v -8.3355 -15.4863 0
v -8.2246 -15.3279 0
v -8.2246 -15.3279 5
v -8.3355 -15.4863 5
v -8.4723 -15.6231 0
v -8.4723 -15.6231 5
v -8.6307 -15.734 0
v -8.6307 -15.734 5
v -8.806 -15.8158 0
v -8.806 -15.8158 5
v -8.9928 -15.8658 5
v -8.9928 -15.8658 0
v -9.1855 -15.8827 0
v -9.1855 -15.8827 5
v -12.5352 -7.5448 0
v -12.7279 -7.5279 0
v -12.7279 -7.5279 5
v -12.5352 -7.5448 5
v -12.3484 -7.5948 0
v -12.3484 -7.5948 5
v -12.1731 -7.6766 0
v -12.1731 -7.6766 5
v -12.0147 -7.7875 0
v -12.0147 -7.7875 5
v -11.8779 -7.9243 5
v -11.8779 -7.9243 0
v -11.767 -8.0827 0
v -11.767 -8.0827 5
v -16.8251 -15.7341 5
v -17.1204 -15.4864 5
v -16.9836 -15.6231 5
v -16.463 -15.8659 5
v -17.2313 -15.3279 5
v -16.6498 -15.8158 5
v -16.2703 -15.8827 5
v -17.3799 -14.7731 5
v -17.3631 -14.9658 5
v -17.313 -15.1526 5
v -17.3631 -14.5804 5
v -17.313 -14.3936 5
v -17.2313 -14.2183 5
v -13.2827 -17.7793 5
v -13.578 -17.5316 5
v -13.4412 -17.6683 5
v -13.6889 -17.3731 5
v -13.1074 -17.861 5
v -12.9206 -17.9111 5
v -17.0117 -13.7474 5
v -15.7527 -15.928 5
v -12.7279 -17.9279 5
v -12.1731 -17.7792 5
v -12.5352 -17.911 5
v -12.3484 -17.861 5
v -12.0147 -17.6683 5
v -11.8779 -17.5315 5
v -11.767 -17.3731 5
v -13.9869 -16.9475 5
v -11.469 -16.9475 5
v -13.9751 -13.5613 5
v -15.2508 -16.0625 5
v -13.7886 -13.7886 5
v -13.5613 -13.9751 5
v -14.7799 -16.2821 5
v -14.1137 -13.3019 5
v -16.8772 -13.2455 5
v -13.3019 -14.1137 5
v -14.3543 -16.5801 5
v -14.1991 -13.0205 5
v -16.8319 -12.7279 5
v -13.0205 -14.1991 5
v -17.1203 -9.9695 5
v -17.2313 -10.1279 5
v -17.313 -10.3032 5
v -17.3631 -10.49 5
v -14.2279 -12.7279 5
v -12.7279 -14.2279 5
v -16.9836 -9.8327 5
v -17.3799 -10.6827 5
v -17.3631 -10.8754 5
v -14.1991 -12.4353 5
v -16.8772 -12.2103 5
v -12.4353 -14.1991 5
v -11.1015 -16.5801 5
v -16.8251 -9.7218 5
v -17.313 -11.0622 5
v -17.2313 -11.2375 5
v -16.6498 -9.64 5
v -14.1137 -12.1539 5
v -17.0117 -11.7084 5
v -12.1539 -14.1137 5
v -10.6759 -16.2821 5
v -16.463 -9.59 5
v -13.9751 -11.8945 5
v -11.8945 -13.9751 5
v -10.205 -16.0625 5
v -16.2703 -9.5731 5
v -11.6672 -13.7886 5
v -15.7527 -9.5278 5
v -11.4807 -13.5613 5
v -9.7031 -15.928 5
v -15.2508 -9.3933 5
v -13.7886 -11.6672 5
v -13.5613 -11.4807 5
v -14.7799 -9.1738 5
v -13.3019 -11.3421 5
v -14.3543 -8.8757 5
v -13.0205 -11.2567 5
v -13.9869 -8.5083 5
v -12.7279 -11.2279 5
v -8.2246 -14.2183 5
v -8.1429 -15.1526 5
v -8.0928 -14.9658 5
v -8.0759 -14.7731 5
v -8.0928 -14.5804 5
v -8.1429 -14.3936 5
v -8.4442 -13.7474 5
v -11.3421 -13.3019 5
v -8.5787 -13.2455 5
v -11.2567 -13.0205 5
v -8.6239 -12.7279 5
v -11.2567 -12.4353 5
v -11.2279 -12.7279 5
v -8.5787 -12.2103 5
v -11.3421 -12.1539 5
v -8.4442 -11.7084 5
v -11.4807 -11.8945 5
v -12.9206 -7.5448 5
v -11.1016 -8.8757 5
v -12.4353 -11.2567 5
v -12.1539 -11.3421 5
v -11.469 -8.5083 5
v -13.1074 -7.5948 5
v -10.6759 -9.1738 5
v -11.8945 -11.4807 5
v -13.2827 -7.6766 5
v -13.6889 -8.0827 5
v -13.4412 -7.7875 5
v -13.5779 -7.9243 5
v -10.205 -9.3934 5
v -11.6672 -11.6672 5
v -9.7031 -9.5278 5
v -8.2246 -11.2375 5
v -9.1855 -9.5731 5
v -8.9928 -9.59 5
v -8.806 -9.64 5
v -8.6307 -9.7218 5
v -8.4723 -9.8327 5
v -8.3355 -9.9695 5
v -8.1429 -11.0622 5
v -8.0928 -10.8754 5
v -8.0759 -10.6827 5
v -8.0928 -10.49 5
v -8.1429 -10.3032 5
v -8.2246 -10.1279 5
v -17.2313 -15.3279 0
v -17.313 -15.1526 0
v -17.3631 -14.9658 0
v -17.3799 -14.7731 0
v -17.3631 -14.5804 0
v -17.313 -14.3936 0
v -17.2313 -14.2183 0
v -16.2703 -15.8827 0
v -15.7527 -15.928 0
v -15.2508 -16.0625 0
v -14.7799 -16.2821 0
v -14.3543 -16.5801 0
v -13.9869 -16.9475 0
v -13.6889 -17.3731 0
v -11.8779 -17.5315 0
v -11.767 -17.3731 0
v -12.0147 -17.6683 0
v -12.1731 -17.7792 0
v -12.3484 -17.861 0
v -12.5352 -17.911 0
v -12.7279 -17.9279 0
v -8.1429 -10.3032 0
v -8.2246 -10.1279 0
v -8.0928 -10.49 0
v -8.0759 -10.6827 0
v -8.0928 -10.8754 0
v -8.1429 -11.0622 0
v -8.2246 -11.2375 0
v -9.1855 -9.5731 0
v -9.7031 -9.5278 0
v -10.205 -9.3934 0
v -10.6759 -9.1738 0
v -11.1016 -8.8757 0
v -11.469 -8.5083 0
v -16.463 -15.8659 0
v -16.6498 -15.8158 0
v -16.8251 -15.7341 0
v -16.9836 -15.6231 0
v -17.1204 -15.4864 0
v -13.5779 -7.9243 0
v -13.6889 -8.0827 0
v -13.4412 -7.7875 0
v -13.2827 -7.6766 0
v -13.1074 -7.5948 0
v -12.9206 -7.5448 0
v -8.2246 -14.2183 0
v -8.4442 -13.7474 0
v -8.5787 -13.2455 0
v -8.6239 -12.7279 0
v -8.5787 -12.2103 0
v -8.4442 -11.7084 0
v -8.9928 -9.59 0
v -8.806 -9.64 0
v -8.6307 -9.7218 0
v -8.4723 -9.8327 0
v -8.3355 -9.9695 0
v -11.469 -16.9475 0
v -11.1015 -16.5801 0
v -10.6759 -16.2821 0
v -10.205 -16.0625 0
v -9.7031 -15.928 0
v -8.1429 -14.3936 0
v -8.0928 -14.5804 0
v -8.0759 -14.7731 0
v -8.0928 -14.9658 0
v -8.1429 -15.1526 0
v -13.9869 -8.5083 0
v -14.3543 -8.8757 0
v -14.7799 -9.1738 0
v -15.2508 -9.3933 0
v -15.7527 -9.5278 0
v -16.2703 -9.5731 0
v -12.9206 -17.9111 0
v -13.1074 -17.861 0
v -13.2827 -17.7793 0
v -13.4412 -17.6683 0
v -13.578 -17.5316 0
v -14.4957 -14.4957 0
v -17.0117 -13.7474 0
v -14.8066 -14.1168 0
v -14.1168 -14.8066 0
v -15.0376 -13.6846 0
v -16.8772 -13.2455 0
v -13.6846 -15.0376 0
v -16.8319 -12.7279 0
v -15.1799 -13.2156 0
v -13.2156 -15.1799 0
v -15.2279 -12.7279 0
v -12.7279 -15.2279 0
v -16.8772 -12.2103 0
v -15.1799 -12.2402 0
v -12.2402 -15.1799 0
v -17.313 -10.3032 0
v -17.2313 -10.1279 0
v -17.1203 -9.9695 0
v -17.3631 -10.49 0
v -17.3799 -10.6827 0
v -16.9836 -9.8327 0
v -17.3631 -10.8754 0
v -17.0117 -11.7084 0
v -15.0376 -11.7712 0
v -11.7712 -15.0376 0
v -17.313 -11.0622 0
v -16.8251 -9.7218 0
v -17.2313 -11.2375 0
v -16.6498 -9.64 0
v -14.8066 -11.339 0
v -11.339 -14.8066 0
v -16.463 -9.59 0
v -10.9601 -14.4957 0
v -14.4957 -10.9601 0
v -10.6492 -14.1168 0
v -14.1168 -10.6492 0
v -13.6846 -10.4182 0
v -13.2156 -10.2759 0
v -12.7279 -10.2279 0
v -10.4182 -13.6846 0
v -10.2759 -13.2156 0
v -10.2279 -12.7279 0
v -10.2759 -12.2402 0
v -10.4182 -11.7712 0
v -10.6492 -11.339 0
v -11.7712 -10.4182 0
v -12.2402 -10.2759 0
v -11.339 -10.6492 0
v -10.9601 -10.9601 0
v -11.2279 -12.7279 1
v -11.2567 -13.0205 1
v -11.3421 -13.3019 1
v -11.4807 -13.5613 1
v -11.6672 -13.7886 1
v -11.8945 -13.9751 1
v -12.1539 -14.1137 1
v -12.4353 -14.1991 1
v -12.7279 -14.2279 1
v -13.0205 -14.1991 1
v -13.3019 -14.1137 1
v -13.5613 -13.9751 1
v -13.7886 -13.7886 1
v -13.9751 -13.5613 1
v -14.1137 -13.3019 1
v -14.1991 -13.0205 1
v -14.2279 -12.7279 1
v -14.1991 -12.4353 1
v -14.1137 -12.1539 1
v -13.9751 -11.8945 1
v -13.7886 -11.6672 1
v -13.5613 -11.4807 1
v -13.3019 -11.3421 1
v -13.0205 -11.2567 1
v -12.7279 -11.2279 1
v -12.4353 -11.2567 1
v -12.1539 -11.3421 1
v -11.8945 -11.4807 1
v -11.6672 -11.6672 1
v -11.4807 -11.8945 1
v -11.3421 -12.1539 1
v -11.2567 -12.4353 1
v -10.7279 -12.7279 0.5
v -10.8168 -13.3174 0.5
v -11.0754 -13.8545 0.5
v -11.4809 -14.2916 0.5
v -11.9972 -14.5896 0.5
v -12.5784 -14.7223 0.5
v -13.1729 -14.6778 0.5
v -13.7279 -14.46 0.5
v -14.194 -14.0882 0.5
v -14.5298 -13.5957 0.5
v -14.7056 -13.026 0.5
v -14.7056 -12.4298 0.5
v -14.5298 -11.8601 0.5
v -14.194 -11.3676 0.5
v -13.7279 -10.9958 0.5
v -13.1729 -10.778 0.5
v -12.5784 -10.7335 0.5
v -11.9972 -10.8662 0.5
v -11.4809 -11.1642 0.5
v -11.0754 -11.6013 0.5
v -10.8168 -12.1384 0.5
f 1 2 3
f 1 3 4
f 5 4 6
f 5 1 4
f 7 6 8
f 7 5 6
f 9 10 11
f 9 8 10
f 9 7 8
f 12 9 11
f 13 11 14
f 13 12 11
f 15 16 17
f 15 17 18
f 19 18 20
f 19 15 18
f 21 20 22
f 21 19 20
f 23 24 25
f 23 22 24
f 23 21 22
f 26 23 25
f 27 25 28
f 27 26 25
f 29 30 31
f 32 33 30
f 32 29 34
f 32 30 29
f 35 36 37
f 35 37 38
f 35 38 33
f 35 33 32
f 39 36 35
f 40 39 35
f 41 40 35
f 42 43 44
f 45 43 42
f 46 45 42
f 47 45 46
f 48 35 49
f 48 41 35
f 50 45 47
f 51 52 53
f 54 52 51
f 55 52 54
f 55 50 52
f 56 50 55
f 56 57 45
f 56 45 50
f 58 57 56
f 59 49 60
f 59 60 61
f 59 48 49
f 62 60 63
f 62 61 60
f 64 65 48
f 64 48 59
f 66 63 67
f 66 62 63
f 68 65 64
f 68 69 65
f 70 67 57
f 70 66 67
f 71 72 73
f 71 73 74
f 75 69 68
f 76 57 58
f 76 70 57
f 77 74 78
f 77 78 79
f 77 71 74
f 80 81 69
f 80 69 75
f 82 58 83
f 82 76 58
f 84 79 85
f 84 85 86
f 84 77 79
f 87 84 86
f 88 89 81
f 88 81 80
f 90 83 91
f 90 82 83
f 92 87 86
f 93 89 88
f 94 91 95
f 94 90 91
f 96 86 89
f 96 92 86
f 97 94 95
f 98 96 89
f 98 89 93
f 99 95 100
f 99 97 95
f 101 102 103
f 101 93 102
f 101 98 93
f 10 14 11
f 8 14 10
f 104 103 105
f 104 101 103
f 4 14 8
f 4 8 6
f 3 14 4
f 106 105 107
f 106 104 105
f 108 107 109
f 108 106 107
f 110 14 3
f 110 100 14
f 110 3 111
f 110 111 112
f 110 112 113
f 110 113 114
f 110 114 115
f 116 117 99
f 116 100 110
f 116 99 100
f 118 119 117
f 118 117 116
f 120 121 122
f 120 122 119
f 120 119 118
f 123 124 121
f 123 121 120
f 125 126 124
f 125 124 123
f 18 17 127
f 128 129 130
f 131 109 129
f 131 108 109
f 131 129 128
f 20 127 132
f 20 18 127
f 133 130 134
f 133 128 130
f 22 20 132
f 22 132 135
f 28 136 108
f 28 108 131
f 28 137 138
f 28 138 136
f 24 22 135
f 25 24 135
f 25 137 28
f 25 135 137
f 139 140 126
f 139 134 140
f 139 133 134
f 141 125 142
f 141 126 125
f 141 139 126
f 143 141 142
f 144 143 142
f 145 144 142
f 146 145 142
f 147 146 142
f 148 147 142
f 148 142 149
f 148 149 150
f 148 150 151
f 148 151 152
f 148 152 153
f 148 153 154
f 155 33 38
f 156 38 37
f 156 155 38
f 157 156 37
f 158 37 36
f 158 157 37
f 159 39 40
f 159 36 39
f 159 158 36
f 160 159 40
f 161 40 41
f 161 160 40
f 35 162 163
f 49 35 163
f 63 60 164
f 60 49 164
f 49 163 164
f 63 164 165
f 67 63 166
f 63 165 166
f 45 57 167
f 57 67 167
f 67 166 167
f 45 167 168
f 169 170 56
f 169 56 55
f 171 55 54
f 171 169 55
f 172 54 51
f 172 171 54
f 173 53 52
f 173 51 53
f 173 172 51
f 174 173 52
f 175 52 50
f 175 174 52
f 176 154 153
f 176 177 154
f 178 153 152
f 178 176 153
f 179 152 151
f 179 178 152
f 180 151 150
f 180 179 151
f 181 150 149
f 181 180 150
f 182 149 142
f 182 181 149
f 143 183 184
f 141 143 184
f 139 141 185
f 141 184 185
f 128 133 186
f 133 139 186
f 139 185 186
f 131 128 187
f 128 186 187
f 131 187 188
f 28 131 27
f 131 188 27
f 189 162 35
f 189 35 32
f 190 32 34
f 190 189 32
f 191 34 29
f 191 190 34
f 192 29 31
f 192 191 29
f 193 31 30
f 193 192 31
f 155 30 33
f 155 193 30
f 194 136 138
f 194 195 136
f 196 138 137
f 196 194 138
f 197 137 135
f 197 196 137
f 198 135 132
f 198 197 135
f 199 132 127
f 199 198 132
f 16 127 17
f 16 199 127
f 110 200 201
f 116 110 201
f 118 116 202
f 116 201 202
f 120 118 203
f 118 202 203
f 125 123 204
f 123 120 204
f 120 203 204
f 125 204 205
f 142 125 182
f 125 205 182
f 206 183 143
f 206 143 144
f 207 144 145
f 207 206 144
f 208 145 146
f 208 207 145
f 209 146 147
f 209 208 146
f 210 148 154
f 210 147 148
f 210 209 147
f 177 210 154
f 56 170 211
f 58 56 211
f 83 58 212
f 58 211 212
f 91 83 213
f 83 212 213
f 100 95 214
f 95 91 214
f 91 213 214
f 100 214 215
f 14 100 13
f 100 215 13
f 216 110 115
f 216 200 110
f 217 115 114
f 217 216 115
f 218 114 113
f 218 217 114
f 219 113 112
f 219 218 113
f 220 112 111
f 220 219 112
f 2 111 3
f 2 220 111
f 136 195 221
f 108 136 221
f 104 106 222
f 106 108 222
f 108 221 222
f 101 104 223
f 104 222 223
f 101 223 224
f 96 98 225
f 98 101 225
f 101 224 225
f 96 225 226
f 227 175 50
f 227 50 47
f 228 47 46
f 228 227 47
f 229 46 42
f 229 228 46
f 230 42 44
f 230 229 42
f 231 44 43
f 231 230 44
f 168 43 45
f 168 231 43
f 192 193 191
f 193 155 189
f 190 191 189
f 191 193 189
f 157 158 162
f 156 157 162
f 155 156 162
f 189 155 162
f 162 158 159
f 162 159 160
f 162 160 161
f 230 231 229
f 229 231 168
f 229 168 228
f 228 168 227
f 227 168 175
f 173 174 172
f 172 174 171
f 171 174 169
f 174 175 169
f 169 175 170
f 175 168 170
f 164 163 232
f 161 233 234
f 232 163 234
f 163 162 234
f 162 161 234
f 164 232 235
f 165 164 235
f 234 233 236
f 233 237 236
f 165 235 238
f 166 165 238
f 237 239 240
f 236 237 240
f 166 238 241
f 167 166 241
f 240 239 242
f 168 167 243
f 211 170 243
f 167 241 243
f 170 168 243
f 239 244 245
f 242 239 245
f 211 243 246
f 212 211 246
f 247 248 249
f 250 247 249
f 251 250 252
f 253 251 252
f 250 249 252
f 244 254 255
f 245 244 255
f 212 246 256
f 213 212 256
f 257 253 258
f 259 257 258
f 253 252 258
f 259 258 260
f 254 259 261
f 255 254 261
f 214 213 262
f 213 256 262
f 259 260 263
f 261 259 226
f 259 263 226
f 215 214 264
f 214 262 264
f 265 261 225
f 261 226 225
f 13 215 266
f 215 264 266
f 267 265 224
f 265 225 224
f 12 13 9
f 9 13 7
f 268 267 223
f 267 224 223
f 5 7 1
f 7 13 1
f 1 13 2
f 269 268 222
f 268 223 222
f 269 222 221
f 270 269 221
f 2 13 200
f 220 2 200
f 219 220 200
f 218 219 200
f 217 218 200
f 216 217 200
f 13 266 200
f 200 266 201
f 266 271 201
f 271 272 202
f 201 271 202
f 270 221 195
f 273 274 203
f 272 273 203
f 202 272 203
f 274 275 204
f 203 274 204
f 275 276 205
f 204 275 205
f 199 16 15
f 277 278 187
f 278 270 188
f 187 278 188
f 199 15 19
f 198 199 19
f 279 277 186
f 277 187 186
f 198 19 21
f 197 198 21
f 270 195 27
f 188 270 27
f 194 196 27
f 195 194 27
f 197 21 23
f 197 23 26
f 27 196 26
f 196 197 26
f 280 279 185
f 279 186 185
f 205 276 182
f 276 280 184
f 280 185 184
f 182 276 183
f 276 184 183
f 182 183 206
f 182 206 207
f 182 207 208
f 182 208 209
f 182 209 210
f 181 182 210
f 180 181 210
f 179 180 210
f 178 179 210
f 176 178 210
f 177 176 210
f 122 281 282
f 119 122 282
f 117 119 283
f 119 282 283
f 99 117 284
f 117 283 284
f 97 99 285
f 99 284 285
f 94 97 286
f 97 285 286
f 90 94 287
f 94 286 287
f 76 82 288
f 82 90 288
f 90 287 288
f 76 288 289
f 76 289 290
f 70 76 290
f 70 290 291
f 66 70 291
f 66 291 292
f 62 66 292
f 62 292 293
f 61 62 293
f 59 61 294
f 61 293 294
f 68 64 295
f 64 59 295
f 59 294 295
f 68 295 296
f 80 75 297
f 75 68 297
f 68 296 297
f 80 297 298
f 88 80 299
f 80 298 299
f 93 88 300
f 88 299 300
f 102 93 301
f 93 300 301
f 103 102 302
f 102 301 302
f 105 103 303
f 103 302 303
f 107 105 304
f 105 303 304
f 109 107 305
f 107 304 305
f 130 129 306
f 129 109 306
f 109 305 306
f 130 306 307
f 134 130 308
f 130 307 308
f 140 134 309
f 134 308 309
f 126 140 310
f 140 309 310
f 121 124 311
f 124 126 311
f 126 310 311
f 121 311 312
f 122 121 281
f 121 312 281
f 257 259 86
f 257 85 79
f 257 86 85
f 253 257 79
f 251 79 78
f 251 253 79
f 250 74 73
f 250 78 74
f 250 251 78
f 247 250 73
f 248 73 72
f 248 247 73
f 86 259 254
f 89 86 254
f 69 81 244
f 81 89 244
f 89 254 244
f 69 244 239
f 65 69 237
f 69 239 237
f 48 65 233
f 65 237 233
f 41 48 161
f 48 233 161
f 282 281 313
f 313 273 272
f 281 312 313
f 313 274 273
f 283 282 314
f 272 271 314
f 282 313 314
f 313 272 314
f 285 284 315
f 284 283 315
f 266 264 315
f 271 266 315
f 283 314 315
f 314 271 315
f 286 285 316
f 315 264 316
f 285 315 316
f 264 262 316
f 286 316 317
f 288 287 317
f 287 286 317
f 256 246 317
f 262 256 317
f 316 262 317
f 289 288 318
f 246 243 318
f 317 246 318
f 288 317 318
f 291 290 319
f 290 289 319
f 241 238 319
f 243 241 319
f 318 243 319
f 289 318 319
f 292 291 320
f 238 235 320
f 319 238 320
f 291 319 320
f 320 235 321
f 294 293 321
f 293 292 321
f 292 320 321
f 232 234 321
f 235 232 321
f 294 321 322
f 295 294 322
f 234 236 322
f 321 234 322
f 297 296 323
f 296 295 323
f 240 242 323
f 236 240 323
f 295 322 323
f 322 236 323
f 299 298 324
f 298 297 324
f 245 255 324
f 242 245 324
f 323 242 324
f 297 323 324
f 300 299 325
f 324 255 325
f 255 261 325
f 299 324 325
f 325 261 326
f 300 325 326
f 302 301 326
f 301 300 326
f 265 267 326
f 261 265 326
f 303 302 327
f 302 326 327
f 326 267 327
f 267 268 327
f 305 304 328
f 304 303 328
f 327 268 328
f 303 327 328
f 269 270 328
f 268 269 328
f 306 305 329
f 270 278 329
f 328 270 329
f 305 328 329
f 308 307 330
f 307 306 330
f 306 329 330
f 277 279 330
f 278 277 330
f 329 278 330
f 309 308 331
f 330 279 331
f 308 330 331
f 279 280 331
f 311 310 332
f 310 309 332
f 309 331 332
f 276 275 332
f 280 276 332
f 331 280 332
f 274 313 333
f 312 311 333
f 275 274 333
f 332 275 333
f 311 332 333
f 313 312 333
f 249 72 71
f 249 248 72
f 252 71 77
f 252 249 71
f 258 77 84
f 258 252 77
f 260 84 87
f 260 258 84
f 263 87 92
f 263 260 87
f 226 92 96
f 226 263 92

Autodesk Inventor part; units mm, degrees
ref_plane "YZ Plane" through (0, 0, 0) normal (1, 0, 0) x (0, 1, 0)
ref_plane "XZ Plane" through (0, 0, 0) normal (0, 1, 0) x (-1, 0, 0)
ref_plane "XY Plane" through (0, 0, 0) normal (0, 0, 1) x (1, 0, 0)
sketch "スケッチ1" plane through (0, 0, 0) normal (0, 0, 1) x (1, 0, 0)
  arc A0 (-16.2703, -9.5731) -> (-13.6889, -8.0827) centre (-16.2703, -6.5923) ccw
  arc A1 (-16.2703, -9.5731) -> (-17.2313, -10.1279) centre (-16.2703, -10.6827) ccw
  arc A2 (-17.2313, -10.1279) -> (-17.2313, -11.2375) centre (-16.2703, -10.6827) ccw
  arc A3 (-17.2313, -14.2183) -> (-17.2313, -11.2375) centre (-19.8127, -12.7279) ccw
  arc A4 (-17.2313, -14.2183) -> (-17.2313, -15.3279) centre (-16.2703, -14.7731) ccw
  arc A5 (-17.2313, -15.3279) -> (-16.2703, -15.8827) centre (-16.2703, -14.7731) ccw
  arc A6 (-13.6889, -17.3731) -> (-16.2703, -15.8827) centre (-16.2703, -18.8635) ccw
  arc A7 (-13.6889, -17.3731) -> (-12.7279, -17.9279) centre (-12.7279, -16.8183) ccw
  arc A8 (-12.7279, -17.9279) -> (-11.767, -17.3731) centre (-12.7279, -16.8183) ccw
  arc A9 (-9.1855, -15.8827) -> (-11.767, -17.3731) centre (-9.1855, -18.8635) ccw
  arc A10 (-9.1855, -15.8827) -> (-8.2246, -15.3279) centre (-9.1855, -14.7731) ccw
  arc A11 (-8.2246, -15.3279) -> (-8.2246, -14.2183) centre (-9.1855, -14.7731) ccw
  arc A12 (-8.2246, -11.2375) -> (-8.2246, -14.2183) centre (-5.6431, -12.7279) ccw
  arc A13 (-8.2246, -11.2375) -> (-8.2246, -10.1279) centre (-9.1855, -10.6827) ccw
  arc A14 (-8.2246, -10.1279) -> (-9.1855, -9.5731) centre (-9.1855, -10.6827) ccw
  arc A15 (-11.767, -8.0827) -> (-9.1855, -9.5731) centre (-9.1855, -6.5923) ccw
  arc A16 (-11.767, -8.0827) -> (-12.7279, -7.5279) centre (-12.7279, -8.6375) ccw
  arc A17 (-12.7279, -7.5279) -> (-13.6889, -8.0827) centre (-12.7279, -8.6375) ccw
  circle A18 centre (-12.7279, -12.7279) radius 1.5 construction
  circle A19 centre (-12.7279, -12.7279) radius 1.5
  circle A20 centre (-12.7279, -12.7279) radius 6
  point P0 (0, 0)
  point P1 (0, 0)
  dimension "d0" = 3
extrude "押し出し1" add sketch "スケッチ1" along normal blind 5 contours A0 A17 A16 A15 A14 A13 A12 A11 A10 A9 A8 A7 A6 A5 A4 A3 A2 A1
chamfer "面取り1" distance 1 angle 45 1 edges at (-14.2279, -12.7279, 0)
sketch "書きだし" plane through (0, 0, 5) normal (0, 0, 1) x (1, 0, 0)
  arc A0 (-17.2313, -14.2183) -> (-16.2703, -15.8827) centre (-16.2703, -14.7731) ccw projected
  arc A1 (-13.6889, -17.3731) -> (-16.2703, -15.8827) centre (-16.2703, -18.8635) ccw projected
  arc A2 (-13.6889, -17.3731) -> (-11.767, -17.3731) centre (-12.7279, -16.8183) ccw projected
  arc A3 (-9.1855, -15.8827) -> (-11.767, -17.3731) centre (-9.1855, -18.8635) ccw projected
  arc A4 (-9.1855, -15.8827) -> (-8.2246, -14.2183) centre (-9.1855, -14.7731) ccw projected
  arc A5 (-8.2246, -11.2375) -> (-8.2246, -14.2183) centre (-5.6431, -12.7279) ccw projected
  arc A6 (-8.2246, -11.2375) -> (-9.1855, -9.5731) centre (-9.1855, -10.6827) ccw projected
  arc A7 (-11.767, -8.0827) -> (-9.1855, -9.5731) centre (-9.1855, -6.5923) ccw projected
  arc A8 (-11.767, -8.0827) -> (-13.6889, -8.0827) centre (-12.7279, -8.6375) ccw projected
  arc A9 (-16.2703, -9.5731) -> (-13.6889, -8.0827) centre (-16.2703, -6.5923) ccw projected
  arc A10 (-16.2703, -9.5731) -> (-17.2313, -11.2375) centre (-16.2703, -10.6827) ccw projected
  arc A11 (-17.2313, -14.2183) -> (-17.2313, -11.2375) centre (-19.8127, -12.7279) ccw projected
  circle A12 centre (-12.7279, -12.7279) radius 1.5 projected
  point P0 (0, 0)
properties part number "原動節接続部v2内-2" material "アルミニウム 2014-T4"
